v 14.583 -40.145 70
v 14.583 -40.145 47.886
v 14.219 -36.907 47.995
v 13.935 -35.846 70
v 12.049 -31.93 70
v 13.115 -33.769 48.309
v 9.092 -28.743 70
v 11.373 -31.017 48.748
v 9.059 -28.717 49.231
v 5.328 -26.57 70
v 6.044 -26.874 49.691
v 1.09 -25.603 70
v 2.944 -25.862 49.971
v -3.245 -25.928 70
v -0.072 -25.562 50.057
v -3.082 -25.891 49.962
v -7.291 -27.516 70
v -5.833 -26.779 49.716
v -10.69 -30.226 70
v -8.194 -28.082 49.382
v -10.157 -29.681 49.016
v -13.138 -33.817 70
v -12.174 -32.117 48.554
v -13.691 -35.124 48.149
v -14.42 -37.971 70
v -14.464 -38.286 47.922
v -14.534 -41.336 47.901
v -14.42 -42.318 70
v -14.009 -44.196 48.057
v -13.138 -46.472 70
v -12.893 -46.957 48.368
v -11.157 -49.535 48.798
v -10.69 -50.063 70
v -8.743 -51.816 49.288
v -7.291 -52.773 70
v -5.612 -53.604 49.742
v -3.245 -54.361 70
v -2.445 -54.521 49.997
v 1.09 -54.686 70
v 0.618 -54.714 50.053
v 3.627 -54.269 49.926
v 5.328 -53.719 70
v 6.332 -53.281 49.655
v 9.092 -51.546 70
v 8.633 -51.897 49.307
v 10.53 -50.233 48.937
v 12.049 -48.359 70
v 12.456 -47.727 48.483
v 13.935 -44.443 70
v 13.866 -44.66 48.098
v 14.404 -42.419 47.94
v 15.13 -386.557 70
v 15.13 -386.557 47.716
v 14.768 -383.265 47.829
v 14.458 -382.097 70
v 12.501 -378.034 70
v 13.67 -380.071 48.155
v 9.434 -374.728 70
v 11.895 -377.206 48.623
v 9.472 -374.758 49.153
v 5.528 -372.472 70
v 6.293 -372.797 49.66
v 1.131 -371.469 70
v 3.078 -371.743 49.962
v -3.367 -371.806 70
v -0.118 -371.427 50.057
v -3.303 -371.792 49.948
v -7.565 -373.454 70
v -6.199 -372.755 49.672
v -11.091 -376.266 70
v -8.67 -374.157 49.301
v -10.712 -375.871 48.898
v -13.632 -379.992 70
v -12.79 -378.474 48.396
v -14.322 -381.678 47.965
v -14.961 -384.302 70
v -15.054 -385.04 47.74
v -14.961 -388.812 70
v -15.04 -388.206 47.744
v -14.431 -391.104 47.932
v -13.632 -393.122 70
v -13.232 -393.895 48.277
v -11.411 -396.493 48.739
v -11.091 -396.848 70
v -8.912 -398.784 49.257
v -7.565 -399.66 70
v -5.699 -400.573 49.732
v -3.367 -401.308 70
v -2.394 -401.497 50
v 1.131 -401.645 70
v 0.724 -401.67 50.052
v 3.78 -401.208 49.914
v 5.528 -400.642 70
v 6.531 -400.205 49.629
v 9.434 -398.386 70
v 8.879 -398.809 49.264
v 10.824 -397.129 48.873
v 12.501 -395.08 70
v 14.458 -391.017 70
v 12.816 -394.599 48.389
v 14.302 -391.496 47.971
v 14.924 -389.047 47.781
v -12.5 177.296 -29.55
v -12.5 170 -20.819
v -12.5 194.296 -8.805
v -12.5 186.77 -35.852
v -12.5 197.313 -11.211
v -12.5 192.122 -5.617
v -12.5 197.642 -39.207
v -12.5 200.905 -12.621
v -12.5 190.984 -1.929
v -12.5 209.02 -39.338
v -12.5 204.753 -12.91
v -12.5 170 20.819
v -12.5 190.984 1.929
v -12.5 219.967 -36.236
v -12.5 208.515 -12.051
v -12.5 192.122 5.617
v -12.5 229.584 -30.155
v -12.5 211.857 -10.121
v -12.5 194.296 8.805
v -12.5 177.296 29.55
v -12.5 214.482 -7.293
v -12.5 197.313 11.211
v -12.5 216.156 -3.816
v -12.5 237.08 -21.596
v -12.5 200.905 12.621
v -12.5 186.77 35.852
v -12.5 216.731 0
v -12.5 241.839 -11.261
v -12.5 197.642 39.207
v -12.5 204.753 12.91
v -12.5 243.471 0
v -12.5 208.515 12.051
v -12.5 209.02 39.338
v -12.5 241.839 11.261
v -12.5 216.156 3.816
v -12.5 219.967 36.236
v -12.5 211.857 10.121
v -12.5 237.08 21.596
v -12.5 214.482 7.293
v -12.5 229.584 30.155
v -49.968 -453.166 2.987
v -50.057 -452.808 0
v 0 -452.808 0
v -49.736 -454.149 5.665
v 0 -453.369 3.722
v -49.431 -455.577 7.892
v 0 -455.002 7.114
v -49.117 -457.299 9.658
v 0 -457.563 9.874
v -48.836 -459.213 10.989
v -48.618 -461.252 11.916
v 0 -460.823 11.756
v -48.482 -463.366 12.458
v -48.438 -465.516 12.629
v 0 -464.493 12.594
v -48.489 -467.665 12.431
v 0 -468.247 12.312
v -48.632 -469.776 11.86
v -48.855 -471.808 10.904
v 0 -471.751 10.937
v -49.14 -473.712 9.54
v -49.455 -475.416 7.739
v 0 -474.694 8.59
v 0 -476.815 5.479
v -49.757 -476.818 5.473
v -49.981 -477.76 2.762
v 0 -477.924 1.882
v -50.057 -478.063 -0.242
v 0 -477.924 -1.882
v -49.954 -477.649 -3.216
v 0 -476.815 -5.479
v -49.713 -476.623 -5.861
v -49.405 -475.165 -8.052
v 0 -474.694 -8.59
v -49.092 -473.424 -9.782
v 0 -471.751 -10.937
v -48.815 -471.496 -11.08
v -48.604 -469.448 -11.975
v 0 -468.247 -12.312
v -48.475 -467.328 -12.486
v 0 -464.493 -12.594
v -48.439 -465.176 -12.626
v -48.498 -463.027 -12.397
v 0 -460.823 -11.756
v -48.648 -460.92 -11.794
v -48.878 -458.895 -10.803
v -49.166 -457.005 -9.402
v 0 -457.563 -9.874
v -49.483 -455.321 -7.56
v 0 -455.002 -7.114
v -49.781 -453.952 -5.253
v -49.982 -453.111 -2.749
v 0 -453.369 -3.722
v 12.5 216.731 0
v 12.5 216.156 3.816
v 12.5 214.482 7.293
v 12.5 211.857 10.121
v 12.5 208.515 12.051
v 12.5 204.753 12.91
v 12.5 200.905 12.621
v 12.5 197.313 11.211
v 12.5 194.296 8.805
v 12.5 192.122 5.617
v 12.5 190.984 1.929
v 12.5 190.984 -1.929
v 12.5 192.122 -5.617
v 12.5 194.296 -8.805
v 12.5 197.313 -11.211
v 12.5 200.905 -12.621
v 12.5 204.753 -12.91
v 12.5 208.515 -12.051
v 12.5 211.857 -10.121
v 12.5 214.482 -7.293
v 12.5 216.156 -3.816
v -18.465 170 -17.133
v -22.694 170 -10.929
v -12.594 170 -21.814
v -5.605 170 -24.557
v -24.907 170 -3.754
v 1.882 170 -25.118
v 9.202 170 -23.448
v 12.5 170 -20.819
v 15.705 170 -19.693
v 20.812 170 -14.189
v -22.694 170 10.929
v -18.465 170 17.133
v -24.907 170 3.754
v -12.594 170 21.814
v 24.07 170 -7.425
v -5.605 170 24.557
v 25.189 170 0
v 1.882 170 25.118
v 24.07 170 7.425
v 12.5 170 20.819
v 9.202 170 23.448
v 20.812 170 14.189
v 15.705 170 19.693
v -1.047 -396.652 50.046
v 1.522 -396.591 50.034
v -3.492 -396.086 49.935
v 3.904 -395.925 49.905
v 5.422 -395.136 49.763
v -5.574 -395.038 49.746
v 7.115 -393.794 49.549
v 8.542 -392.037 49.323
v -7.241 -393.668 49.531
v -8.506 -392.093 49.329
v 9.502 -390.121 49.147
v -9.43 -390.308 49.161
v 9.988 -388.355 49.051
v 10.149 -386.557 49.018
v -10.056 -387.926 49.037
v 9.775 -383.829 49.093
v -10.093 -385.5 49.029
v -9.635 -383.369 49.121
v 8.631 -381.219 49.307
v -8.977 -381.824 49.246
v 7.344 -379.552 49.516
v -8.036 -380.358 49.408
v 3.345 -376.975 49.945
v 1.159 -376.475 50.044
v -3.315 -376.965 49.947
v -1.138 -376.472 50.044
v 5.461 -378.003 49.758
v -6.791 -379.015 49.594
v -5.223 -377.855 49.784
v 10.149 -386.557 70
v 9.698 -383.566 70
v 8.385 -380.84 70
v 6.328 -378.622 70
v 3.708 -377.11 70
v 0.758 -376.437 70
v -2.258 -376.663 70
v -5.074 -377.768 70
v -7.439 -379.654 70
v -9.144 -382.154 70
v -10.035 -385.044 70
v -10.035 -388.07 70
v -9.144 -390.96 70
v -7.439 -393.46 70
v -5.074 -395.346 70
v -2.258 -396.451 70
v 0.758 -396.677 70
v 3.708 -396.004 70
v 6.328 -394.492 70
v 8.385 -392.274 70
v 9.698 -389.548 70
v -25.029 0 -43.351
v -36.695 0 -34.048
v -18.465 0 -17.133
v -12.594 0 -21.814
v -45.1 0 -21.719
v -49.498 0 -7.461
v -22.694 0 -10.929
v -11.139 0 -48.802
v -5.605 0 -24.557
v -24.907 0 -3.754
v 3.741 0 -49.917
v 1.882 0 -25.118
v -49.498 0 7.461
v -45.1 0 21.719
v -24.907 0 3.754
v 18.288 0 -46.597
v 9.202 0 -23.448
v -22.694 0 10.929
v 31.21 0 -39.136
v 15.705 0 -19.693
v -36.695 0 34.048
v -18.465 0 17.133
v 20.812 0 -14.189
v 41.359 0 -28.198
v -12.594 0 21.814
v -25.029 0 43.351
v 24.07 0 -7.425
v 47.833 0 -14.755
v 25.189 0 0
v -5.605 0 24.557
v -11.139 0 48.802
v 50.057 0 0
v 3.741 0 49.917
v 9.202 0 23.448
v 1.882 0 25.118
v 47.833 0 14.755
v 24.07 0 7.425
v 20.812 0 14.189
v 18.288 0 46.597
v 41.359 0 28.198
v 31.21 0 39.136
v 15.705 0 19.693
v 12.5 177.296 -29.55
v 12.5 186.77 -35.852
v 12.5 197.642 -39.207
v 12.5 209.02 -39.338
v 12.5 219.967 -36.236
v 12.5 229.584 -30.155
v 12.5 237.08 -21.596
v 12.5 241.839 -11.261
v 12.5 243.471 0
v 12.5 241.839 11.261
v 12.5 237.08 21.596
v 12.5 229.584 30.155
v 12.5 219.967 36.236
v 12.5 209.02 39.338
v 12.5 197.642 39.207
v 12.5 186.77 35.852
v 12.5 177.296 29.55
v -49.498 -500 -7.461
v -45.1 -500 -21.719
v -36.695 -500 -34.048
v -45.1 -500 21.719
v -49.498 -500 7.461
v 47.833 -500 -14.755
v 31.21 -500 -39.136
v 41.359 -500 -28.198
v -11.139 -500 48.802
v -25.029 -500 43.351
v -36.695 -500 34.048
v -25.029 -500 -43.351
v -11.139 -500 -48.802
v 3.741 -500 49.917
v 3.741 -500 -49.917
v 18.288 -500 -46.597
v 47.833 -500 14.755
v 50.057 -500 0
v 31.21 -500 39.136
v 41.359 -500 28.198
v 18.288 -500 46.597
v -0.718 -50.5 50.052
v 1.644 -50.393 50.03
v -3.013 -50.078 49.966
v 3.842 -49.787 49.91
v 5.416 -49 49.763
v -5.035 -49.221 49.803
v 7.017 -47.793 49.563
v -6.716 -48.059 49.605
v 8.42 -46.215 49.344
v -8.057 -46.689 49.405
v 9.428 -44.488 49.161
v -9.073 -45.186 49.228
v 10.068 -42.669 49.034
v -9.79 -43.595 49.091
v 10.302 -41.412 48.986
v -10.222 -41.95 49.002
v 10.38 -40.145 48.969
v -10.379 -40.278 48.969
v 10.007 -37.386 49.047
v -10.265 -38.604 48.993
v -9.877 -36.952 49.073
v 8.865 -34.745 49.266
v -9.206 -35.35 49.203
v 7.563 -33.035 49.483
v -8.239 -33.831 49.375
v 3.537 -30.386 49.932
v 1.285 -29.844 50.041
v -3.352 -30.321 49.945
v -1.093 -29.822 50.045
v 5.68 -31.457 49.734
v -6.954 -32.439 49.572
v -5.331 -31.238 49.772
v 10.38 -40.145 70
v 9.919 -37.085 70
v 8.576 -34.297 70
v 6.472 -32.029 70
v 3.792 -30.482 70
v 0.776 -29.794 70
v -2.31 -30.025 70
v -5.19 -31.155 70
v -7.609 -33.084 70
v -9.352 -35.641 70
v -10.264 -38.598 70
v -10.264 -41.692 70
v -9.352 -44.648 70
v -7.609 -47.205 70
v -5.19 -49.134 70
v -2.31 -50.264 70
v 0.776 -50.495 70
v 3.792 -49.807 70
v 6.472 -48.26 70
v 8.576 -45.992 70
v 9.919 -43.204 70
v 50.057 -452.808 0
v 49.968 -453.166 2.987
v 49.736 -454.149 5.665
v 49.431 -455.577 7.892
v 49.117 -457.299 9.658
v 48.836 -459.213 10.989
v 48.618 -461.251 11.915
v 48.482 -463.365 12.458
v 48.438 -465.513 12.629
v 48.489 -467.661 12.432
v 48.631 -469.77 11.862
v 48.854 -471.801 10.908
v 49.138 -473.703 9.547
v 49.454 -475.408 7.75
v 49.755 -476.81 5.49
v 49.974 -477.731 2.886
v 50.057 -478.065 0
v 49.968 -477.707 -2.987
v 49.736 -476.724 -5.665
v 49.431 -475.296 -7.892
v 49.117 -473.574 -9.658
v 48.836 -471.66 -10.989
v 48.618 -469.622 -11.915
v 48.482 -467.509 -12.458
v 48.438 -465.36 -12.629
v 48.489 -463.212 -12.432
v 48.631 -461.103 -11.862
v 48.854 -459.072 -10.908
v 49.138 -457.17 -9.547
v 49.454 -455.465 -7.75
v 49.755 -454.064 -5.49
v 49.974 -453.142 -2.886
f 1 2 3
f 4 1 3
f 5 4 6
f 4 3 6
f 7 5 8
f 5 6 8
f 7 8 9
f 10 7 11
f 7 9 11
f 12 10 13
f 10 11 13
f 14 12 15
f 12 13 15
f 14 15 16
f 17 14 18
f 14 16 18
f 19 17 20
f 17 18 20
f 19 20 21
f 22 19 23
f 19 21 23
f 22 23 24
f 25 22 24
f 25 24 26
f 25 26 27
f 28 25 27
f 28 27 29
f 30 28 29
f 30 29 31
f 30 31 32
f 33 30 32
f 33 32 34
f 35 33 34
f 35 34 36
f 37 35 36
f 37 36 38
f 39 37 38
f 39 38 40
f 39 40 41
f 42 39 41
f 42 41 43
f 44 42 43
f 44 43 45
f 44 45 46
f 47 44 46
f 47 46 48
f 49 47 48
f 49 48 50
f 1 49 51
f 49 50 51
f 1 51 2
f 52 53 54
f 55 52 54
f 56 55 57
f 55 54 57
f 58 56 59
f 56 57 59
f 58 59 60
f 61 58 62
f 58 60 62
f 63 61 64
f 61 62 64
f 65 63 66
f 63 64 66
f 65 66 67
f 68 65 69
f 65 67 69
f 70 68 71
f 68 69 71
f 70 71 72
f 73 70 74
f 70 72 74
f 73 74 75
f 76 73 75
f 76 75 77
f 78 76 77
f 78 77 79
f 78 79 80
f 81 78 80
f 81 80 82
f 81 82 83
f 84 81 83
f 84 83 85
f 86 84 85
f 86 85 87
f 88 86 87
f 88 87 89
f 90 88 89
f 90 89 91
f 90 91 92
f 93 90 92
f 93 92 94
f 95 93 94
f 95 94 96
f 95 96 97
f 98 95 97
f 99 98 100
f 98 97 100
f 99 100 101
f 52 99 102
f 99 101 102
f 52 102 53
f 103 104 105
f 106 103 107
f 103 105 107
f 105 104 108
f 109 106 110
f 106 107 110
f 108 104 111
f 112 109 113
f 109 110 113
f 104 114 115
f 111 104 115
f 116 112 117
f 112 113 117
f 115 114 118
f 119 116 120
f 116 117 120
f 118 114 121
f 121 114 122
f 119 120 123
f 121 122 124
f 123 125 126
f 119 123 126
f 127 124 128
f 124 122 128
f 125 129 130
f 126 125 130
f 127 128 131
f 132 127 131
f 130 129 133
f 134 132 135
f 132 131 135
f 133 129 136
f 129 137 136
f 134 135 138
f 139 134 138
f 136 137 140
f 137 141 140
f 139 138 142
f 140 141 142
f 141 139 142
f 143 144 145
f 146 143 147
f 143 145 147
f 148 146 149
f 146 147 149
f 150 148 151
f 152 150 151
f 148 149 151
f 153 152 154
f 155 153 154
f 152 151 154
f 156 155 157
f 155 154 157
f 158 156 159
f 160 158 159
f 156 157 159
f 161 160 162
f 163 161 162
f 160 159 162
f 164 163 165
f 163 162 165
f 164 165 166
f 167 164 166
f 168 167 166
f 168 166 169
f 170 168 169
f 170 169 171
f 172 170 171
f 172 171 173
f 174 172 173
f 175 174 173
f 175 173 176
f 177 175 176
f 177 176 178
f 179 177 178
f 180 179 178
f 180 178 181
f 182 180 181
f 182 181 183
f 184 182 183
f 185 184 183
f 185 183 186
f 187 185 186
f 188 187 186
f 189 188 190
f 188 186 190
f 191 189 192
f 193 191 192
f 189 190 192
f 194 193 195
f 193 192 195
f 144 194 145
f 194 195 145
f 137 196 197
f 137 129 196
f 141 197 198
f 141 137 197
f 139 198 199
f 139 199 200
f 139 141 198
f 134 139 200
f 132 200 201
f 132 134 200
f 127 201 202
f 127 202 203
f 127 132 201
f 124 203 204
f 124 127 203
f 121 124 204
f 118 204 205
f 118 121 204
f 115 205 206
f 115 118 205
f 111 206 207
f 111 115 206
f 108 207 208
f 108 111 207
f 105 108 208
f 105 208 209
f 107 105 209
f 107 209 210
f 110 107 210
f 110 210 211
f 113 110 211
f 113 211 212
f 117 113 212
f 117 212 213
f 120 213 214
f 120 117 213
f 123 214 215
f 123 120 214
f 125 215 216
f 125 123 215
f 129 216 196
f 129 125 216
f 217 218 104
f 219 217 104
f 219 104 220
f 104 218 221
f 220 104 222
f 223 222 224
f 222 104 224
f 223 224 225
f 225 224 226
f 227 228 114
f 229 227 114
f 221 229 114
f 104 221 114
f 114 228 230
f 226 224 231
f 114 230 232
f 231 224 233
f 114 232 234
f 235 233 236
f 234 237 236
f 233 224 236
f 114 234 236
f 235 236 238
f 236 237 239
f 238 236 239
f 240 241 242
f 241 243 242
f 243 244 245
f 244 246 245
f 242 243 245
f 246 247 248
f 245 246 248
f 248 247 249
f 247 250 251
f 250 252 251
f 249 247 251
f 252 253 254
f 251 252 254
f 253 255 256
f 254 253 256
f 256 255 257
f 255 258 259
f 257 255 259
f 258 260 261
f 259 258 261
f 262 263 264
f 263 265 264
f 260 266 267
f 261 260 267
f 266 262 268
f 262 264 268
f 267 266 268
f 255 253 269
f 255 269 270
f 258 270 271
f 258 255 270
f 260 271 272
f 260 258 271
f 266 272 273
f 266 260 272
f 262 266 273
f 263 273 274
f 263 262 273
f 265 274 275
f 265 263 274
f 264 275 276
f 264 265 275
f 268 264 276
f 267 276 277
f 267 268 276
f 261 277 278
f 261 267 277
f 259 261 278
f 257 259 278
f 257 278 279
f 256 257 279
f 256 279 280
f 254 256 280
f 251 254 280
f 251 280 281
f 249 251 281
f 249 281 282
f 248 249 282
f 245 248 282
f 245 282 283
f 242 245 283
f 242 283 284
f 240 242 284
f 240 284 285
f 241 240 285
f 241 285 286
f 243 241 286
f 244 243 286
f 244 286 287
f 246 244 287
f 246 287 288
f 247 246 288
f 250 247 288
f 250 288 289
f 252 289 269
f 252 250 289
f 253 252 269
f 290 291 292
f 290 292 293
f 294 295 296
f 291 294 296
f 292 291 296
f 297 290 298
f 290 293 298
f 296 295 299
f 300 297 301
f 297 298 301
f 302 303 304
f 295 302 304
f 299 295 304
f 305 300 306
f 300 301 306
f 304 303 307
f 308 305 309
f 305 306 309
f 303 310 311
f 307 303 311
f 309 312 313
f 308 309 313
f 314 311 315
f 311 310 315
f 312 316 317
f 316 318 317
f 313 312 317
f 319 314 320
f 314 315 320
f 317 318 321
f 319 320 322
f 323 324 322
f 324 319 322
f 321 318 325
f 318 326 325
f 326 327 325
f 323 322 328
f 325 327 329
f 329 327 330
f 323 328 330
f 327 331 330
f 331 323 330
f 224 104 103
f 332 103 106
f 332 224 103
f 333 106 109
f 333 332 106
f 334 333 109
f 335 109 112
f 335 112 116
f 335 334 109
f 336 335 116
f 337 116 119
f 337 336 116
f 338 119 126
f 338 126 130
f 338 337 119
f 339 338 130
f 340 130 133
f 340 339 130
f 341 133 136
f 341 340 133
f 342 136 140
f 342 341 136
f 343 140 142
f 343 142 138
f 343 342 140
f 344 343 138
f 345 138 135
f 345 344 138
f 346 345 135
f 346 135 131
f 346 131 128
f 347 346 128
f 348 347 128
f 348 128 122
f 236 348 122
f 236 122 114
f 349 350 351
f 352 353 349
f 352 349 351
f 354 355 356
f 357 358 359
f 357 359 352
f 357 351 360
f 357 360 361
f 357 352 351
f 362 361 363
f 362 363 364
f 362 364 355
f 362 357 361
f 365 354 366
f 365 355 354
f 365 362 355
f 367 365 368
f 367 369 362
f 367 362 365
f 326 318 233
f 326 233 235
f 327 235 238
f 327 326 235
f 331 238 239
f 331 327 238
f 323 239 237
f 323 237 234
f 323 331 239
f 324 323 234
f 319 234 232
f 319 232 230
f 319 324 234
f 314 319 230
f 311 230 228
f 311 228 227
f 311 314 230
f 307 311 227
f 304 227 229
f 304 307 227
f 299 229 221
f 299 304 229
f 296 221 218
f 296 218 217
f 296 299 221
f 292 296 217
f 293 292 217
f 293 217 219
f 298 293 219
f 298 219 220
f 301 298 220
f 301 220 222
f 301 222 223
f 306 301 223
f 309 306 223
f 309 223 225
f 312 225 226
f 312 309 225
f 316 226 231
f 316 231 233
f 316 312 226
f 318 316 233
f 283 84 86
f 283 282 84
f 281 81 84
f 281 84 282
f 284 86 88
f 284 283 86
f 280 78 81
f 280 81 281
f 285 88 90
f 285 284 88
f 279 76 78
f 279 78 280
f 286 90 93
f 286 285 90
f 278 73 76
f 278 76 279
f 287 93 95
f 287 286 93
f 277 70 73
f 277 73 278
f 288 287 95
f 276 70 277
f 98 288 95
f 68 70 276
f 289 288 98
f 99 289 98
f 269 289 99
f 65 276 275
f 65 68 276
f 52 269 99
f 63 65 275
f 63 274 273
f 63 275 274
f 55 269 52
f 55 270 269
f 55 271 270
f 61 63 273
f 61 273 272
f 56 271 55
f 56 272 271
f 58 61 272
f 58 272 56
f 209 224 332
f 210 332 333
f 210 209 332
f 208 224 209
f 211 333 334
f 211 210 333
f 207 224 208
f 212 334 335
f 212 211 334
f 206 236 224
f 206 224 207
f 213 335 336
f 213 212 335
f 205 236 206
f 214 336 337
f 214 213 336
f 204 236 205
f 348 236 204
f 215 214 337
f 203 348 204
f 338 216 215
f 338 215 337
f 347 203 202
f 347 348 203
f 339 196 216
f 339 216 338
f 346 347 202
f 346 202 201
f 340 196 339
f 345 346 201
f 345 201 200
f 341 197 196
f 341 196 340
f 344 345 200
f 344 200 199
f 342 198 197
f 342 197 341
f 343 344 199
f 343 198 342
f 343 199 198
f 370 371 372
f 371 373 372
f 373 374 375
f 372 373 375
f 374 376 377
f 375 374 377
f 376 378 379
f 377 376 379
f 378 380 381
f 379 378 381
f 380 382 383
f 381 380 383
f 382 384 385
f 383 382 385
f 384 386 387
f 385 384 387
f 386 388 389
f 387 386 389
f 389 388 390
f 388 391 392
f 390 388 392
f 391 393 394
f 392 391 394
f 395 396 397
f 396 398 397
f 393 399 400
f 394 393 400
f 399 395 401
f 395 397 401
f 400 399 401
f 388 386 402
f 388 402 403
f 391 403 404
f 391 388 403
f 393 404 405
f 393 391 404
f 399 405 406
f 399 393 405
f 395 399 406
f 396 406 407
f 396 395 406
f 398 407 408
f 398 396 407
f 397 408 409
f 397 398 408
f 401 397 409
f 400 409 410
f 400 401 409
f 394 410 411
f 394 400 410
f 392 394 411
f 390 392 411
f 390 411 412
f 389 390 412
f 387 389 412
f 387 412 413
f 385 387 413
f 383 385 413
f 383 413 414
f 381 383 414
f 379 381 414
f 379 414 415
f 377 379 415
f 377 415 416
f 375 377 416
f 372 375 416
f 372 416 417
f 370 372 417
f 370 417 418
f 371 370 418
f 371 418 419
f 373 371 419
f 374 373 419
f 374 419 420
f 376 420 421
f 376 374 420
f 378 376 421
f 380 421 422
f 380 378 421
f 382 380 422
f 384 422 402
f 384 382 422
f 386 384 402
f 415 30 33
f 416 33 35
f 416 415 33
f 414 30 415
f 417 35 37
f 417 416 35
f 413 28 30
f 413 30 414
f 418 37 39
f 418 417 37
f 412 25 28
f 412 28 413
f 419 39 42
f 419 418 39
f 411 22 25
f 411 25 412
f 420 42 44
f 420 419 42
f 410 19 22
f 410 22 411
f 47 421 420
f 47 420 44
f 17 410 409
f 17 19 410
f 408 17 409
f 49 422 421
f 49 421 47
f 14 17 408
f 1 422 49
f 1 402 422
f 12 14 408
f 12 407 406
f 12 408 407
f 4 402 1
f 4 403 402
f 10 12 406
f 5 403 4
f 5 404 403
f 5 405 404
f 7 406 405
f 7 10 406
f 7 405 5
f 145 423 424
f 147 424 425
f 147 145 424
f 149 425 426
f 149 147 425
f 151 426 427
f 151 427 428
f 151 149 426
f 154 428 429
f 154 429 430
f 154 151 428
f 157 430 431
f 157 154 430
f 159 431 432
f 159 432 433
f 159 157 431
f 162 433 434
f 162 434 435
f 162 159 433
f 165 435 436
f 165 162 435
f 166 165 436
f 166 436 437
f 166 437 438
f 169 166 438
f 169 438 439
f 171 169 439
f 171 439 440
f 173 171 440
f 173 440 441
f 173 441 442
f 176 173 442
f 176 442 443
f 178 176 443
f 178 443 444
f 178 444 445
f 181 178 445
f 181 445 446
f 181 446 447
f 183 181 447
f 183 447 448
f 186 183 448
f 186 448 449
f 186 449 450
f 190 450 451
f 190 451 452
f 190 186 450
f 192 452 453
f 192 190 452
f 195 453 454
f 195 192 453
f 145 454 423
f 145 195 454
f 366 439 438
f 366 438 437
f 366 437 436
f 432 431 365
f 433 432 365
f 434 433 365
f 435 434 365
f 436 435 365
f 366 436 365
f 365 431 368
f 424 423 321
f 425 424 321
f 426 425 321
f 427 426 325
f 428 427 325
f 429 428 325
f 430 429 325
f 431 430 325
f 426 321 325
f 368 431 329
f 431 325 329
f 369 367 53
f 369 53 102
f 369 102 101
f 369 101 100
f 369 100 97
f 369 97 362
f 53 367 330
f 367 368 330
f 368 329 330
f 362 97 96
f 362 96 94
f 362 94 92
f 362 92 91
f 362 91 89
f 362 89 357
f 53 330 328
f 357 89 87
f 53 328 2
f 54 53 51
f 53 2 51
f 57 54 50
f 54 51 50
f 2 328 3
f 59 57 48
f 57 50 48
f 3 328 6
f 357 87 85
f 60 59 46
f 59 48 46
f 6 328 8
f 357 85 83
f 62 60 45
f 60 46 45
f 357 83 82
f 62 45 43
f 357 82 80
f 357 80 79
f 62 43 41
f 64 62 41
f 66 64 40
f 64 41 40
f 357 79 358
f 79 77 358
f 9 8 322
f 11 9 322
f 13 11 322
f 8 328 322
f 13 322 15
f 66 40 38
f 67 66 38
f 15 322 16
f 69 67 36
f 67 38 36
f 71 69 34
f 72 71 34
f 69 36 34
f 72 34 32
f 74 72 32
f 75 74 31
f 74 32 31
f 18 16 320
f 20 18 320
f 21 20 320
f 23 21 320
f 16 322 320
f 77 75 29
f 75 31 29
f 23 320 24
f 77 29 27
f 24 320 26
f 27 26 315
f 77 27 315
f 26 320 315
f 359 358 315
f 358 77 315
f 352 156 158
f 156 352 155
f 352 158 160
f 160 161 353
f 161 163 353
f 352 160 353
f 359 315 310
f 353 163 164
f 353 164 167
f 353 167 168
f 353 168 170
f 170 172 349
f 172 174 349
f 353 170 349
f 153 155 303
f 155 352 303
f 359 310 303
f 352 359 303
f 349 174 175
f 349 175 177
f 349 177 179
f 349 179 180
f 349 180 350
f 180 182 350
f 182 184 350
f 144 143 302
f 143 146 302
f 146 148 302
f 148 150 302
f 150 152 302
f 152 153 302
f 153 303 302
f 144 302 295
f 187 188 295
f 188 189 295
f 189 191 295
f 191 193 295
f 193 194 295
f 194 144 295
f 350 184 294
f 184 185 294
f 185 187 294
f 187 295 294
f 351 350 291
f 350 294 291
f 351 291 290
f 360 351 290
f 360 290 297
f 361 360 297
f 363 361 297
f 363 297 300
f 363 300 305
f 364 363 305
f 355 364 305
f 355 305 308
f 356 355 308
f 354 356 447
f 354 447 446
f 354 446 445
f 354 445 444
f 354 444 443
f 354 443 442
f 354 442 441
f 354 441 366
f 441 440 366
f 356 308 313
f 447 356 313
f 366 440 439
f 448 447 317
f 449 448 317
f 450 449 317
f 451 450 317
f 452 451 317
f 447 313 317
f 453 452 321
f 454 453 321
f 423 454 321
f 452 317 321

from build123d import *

# Parameters (mm, degrees)
F0_R          = 50.0571816825
F1_DEPTH      = 500
F2_R          = 25.188754889
F3_DEPTH      = 170
F4_R          = 39.6850141268
F4_R_2        = 12.9457043272
F5_DEPTH      = 12.5
F6_R          = 12.6289029658
F7_DEPTH      = 50.0581816825
F7_DEPTH_BACK = 50.0581816825
F8_R          = 14.5825404329
F8_R_2        = 10.3798994513
F9_DEPTH      = 70
F10_R         = 15.1304262214
F10_R_2       = 10.1486644431
F11_DEPTH     = 70


with BuildPart() as f1:
    # F0 (on Front) → F1 (new body)
    with BuildSketch(Plane.XZ):
        Circle(F0_R)
    extrude(amount=F1_DEPTH)

    # F2 (on Front) → F3 (join)
    with BuildSketch(Plane.XZ):
        Circle(F2_R)
    extrude(amount=-F3_DEPTH)

    # F4 (on Right) → F5 (join, symmetric)
    with BuildSketch(Plane.YZ):
        with Locations((203.7855833769, 0)):
            Circle(F4_R)
        with Locations((203.7855833769, 0)):
            Circle(F4_R_2, mode=Mode.SUBTRACT)
    extrude(amount=F5_DEPTH, both=True)

    # F6 (on Right) → F7 (cut, two sides)
    with BuildSketch(Plane.YZ) as f7_sk:
        with Locations((-465.4365181923, 0)):
            Circle(F6_R)
    extrude(amount=-F7_DEPTH, mode=Mode.SUBTRACT)
    extrude(f7_sk.sketch, amount=F7_DEPTH_BACK, mode=Mode.SUBTRACT)

    # F8 (on Top) → F9 (join)
    with BuildSketch(Plane.XY):
        with Locations((0, -40.1445440948)):
            Circle(F8_R)
        with Locations((0, -40.1445440948)):
            Circle(F8_R_2, mode=Mode.SUBTRACT)
    extrude(amount=F9_DEPTH)

    # F10 (on Top) → F11 (join)
    with BuildSketch(Plane.XY):
        with Locations((0, -386.5570127964)):
            Circle(F10_R)
        with Locations((0, -386.5570127964)):
            Circle(F10_R_2, mode=Mode.SUBTRACT)
    extrude(amount=F11_DEPTH)


solid = f1.part
